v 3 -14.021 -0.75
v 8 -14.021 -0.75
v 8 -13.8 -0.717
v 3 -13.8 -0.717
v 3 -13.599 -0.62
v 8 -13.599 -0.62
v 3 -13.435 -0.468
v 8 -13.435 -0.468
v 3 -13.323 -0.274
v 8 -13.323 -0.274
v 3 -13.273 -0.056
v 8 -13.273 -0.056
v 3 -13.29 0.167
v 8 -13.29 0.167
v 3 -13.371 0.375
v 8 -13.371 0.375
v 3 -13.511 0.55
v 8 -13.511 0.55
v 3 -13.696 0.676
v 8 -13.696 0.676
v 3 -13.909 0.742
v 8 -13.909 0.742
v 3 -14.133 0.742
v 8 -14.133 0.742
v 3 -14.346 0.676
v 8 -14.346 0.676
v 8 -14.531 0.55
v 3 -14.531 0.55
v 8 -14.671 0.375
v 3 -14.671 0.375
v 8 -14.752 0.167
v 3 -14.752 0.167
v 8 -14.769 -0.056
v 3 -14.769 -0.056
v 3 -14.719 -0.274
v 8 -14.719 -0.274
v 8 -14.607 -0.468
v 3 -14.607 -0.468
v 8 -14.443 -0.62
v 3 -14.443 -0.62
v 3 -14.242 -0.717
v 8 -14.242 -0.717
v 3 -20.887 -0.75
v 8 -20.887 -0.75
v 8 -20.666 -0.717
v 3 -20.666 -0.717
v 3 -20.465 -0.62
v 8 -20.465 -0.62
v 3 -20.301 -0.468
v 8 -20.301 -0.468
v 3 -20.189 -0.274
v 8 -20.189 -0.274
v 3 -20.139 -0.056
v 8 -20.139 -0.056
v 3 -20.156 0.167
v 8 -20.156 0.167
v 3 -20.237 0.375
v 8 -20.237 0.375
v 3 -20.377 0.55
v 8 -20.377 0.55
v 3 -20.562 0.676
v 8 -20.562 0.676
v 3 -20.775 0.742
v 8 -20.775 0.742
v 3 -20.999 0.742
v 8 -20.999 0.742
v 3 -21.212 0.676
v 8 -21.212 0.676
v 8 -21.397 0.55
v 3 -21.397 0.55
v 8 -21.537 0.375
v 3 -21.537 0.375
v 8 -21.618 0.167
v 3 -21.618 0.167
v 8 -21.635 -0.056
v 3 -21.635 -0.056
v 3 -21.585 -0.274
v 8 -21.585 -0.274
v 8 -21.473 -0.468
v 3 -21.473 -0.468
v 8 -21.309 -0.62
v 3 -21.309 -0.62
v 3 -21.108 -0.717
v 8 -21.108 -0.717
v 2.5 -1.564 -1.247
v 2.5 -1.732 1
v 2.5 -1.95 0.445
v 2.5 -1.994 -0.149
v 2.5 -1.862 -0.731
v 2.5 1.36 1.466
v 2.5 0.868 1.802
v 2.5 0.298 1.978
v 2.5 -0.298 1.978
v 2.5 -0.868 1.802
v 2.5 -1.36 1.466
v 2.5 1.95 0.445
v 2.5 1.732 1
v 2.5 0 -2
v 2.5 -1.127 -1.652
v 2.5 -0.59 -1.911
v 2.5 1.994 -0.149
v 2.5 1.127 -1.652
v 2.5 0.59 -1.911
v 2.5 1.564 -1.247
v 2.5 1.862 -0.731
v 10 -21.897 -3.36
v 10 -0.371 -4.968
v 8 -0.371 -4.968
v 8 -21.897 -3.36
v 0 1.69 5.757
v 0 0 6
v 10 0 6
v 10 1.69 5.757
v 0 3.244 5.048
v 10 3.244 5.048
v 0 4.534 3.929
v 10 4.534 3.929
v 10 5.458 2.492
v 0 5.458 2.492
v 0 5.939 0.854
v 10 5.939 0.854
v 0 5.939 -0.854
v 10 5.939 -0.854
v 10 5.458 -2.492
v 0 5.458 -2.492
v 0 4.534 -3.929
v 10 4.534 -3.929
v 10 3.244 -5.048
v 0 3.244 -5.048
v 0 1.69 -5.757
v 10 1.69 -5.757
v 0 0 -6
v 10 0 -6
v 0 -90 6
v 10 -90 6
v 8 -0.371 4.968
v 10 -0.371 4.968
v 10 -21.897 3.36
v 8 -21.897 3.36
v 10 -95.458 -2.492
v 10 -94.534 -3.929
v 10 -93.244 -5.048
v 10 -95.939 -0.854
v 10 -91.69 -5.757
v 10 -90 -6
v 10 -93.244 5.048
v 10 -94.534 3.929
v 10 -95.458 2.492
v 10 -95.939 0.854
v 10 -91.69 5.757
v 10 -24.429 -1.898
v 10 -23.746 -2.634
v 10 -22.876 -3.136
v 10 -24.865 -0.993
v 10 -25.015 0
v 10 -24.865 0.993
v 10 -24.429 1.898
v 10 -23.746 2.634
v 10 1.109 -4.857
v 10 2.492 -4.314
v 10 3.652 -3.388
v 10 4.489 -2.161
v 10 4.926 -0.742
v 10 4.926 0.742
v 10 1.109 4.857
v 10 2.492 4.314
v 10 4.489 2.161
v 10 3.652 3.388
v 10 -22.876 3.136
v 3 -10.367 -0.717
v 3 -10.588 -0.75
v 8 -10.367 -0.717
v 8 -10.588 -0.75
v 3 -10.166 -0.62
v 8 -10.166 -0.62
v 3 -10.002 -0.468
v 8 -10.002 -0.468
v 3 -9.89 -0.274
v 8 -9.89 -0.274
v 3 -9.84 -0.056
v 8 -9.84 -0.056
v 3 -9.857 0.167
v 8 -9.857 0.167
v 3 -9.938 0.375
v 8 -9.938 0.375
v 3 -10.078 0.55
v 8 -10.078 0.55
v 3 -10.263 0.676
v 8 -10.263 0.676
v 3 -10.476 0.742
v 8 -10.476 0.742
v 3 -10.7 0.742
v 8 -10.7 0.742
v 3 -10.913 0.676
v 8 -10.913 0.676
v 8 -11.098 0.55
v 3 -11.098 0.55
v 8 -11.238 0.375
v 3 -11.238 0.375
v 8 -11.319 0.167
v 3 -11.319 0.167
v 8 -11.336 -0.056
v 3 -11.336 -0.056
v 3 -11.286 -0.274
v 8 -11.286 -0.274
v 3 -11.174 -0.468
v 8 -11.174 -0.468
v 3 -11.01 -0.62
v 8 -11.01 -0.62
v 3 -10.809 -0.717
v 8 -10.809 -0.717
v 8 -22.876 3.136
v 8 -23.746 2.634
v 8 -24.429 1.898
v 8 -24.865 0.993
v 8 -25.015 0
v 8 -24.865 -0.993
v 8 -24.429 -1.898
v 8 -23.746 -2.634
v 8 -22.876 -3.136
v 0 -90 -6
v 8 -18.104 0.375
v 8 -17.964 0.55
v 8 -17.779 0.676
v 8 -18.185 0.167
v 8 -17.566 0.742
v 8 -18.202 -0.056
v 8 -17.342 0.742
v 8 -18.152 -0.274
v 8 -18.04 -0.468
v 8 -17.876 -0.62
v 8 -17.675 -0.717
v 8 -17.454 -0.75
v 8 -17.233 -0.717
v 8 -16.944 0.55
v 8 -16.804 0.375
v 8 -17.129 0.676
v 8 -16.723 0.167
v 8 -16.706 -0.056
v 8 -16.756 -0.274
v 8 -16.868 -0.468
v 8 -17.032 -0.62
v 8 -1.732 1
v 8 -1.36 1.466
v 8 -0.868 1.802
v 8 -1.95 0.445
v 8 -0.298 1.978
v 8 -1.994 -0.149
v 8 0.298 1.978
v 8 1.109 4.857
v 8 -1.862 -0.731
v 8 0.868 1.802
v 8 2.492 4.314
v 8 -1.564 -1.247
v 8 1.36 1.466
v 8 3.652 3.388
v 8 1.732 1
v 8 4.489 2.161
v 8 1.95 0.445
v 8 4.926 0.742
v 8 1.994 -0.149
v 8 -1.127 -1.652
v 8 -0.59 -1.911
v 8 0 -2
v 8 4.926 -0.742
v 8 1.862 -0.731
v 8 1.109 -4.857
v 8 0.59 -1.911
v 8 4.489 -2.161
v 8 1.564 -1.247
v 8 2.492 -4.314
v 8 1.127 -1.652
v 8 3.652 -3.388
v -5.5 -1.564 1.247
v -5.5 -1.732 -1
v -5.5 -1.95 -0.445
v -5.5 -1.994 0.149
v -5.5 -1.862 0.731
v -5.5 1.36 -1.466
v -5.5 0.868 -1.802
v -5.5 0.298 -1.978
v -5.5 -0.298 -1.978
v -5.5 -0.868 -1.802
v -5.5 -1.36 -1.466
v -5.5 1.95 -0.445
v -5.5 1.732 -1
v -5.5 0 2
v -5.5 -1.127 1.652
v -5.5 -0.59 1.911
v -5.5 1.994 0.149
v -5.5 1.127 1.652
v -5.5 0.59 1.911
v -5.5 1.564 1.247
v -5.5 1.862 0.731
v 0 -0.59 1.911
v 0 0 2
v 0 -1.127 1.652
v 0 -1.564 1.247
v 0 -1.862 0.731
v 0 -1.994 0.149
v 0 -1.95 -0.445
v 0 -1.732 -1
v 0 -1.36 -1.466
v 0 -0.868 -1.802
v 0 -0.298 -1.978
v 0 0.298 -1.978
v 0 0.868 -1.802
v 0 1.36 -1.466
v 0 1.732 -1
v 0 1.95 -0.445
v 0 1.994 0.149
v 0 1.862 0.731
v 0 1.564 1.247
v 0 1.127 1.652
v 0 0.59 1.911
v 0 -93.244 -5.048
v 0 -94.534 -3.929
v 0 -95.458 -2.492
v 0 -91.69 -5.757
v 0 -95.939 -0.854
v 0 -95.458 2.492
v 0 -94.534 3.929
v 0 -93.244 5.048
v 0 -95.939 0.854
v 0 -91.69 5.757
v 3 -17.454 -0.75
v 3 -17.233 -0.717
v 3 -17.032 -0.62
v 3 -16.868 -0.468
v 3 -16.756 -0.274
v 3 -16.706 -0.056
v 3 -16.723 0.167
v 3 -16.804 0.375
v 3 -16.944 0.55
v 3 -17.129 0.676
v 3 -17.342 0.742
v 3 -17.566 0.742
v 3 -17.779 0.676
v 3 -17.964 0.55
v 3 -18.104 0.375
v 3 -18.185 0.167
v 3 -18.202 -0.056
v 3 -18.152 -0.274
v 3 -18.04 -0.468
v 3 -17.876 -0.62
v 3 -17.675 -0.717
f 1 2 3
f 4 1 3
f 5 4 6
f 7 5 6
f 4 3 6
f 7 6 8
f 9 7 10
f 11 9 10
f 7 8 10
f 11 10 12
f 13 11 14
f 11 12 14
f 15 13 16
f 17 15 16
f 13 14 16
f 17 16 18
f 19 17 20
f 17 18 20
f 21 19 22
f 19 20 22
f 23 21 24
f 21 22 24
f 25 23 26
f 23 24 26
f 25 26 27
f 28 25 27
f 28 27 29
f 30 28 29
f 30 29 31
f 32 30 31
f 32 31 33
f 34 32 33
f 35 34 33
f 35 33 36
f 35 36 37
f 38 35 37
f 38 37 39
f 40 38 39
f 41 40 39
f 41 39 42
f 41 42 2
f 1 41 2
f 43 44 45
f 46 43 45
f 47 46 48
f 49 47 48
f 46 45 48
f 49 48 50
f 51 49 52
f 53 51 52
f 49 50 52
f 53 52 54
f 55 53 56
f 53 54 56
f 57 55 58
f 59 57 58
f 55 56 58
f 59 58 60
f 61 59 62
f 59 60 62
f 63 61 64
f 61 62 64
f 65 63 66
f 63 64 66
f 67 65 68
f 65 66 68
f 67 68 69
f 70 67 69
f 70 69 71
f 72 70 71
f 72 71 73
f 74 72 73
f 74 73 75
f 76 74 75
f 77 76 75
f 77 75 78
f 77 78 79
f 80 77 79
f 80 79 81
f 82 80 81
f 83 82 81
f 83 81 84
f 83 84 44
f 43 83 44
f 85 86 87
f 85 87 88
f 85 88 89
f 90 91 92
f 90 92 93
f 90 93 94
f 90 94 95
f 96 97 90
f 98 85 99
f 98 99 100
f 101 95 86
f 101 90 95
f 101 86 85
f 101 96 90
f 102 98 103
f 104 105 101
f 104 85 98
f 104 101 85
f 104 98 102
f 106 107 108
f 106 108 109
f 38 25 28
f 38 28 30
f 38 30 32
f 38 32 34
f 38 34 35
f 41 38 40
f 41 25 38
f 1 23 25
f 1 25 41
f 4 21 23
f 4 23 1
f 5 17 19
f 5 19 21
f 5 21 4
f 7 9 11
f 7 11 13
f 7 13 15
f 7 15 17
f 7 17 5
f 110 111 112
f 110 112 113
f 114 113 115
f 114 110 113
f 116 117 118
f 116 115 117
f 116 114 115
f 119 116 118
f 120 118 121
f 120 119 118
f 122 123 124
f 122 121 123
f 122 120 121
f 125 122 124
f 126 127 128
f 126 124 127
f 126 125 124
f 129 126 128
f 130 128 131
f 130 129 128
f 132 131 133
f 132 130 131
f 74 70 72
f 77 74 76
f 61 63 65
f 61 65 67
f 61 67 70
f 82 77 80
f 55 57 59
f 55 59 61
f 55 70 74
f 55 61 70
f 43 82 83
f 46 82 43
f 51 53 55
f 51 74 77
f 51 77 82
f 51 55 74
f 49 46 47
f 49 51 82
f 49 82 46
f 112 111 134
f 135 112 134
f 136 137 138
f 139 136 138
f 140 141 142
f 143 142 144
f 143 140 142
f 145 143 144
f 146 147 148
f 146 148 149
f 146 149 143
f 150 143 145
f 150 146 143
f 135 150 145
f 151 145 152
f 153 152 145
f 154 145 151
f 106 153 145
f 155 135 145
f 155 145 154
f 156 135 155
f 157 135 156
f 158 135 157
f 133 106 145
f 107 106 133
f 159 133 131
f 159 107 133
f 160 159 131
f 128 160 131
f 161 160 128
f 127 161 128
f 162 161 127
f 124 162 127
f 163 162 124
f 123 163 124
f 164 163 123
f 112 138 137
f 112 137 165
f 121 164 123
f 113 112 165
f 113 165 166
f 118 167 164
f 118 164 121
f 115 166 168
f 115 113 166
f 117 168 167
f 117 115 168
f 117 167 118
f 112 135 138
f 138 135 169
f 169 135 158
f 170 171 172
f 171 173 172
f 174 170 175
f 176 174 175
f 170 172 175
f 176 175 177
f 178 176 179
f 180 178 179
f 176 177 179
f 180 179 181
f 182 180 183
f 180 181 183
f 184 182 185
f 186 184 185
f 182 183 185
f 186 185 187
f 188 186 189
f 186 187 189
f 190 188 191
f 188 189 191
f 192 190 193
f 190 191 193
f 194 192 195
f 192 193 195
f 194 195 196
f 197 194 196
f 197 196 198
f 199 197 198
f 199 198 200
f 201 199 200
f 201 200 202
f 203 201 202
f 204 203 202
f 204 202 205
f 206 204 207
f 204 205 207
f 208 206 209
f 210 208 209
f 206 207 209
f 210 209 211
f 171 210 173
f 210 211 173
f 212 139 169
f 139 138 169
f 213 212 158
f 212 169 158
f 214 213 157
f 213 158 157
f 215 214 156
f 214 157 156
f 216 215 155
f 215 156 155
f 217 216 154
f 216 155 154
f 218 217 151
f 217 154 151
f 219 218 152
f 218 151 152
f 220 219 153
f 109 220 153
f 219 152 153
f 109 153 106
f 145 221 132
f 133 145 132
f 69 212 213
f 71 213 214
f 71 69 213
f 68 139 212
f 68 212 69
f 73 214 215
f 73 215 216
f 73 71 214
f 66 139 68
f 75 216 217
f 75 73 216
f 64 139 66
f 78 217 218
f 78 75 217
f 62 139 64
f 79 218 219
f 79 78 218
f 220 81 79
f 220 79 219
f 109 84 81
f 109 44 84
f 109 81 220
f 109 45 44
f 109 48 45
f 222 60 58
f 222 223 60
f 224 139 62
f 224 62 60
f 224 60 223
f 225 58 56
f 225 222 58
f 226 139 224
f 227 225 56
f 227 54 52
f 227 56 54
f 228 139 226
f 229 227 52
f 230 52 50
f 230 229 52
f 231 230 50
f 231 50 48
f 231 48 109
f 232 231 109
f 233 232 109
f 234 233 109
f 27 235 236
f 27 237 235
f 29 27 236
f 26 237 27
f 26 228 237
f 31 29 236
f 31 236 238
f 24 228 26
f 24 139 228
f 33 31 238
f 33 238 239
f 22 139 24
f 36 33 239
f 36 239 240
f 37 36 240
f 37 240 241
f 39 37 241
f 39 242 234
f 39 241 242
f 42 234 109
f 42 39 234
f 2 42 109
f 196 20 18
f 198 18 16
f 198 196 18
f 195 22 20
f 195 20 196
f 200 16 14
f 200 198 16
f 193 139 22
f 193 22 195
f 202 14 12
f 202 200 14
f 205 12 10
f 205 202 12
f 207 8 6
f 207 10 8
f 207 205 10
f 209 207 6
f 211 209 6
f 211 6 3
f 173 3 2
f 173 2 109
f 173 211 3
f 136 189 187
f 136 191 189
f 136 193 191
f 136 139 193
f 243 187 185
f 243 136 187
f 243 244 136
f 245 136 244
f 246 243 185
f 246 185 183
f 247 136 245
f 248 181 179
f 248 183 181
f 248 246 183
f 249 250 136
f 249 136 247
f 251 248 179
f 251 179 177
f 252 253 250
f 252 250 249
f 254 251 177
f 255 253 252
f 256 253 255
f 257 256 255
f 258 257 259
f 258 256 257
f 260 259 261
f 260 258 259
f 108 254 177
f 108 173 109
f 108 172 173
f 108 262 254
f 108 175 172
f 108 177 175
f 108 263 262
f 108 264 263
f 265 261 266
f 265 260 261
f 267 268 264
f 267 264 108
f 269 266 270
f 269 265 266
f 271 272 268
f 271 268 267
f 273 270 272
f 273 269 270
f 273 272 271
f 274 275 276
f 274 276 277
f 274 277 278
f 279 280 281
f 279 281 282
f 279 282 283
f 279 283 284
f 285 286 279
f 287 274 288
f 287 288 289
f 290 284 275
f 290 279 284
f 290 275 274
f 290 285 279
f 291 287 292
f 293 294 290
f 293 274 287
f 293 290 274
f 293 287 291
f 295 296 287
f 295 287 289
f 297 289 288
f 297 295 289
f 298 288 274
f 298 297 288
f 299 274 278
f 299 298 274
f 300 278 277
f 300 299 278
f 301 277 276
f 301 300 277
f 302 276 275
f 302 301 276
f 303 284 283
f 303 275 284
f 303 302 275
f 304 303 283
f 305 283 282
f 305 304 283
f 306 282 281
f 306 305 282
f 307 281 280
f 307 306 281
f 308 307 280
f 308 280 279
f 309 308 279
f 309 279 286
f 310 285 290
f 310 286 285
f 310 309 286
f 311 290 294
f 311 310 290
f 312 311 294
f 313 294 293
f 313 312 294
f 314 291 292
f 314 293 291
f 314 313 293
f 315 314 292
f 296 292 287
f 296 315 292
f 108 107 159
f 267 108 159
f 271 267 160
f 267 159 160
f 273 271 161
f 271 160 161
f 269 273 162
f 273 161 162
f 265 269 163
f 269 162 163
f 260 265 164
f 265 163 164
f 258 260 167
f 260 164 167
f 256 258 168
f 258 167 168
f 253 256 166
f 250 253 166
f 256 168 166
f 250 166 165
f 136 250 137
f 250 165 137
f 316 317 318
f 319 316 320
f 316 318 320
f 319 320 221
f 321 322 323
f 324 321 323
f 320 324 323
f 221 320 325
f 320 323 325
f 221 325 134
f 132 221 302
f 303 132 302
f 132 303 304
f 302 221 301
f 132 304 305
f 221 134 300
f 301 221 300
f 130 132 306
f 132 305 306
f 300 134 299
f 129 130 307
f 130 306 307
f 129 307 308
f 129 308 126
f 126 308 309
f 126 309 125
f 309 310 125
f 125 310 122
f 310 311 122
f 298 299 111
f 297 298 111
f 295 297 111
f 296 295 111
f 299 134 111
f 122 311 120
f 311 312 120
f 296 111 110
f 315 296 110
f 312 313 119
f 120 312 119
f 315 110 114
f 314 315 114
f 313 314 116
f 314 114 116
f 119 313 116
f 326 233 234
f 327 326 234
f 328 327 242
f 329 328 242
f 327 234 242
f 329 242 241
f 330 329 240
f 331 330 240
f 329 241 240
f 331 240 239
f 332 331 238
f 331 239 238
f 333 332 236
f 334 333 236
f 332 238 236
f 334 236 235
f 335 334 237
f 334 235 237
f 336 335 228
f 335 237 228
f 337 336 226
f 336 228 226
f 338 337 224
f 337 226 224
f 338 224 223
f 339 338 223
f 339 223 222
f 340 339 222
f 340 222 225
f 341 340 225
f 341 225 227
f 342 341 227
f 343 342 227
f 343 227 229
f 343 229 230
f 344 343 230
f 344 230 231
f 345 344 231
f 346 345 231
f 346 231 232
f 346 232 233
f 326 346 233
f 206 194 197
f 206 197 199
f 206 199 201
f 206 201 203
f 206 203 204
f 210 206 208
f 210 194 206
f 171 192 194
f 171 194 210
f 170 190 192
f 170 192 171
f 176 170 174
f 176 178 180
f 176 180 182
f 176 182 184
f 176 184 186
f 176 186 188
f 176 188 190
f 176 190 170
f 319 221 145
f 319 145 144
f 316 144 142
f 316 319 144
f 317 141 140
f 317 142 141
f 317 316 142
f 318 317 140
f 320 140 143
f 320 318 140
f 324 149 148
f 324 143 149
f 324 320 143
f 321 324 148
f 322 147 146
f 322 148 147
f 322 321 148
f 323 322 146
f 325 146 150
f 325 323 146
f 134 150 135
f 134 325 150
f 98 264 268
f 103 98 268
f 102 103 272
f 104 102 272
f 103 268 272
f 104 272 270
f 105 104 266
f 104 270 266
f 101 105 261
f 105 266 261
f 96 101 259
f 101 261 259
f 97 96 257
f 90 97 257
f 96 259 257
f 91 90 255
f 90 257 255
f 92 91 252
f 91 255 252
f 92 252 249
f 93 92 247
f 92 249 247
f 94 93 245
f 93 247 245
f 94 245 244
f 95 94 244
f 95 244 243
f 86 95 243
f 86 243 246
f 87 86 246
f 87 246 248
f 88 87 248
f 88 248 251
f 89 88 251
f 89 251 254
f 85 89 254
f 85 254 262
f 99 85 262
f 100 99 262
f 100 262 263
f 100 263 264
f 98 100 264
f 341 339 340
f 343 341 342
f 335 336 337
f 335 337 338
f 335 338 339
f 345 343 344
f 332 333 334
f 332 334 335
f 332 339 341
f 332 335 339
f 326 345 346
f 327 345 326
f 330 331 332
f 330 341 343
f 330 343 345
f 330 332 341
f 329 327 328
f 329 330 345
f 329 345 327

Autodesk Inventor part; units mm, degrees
ref_plane "YZ Plane" through (0, 0, 0) normal (1, 0, 0) x (0, 1, 0)
ref_plane "XZ Plane" through (0, 0, 0) normal (0, 1, 0) x (-1, 0, 0)
ref_plane "XY Plane" through (0, 0, 0) normal (0, 0, 1) x (1, 0, 0)
sketch "Sketch1" plane through (0, 0, 0) normal (1, 0, 0) x (0, 1, 0)
  arc A0 (0, -6) -> (0, 6) centre (0, 0) ccw
  line L0 (0, 6) -> (-90, 6)
  line L1 (-90, -6) -> (0, -6)
  arc A1 (-90, 6) -> (-90, -6) centre (-90, 0) ccw
  line L2 (0, 101) -> (0, 6) construction
  line L3 (0, -6) -> (0, -101) construction
  dimension "d1" = 12
  dimension "d3" = 90
extrude "Main Arm" add sketch "Sketch1" along normal blind 10
sketch "Sketch2" plane through (10, 0, 0) normal (1, 0, 0) x (0, 0, -1)
  arc A0 (4.9681, -0.3712) -> (-4.9681, -0.3712) centre (0, 0) ccw
  arc A1 (-3.3596, -21.897) -> (3.3596, -21.897) centre (0, -21.646) ccw
  line L0 (-4.9681, -0.3712) -> (-3.3596, -21.897)
  line L1 (4.9681, -0.3712) -> (3.3596, -21.897)
  point P0 (6, 0)
  dimension "d11" = 9.964
  dimension "d12" = 6.738
  dimension "d13" = 21.646
extrude "Extrusion2" cut sketch "Sketch2" against normal blind 2
sketch "Sketch3" plane through (8, 0, 0) normal (1, 0, 0) x (0, 0, -1)
  circle A0 centre (0, -10.588) radius 0.75
  line L0 (0, 125) -> (0, -125) construction
  circle A1 centre (0, -14.021) radius 0.75
  circle A2 centre (0, -17.454) radius 0.75
  circle A3 centre (0, -20.887) radius 0.75
  point P0 (0, 0)
  dimension "d14" = 1.5
  dimension "d15" = 10.588
  dimension "d19" = 3.433
extrude "Extrusion3" cut sketch "Sketch3" against normal blind 5
sketch "Sketch4" plane through (8, 0, 0) normal (1, 0, 0) x (0, 0, -1)
  circle A0 centre (0, 0) radius 2
  dimension "d26" = 4
extrude "Extrusion4" cut sketch "Sketch4" against normal blind 5.5
sketch "Sketch5" plane through (0, 0, 0) normal (-1, 0, 0) x (0, 0, 1)
  circle A0 centre (0, 0) radius 2 projected
  circle A1 centre (0, 0) radius 2.25
  dimension "d29" = 4.5
extrude "Extrusion5" add sketch "Sketch5" along normal blind 5.5 contours A0
properties part number "Payload Release Actuator Arm"
